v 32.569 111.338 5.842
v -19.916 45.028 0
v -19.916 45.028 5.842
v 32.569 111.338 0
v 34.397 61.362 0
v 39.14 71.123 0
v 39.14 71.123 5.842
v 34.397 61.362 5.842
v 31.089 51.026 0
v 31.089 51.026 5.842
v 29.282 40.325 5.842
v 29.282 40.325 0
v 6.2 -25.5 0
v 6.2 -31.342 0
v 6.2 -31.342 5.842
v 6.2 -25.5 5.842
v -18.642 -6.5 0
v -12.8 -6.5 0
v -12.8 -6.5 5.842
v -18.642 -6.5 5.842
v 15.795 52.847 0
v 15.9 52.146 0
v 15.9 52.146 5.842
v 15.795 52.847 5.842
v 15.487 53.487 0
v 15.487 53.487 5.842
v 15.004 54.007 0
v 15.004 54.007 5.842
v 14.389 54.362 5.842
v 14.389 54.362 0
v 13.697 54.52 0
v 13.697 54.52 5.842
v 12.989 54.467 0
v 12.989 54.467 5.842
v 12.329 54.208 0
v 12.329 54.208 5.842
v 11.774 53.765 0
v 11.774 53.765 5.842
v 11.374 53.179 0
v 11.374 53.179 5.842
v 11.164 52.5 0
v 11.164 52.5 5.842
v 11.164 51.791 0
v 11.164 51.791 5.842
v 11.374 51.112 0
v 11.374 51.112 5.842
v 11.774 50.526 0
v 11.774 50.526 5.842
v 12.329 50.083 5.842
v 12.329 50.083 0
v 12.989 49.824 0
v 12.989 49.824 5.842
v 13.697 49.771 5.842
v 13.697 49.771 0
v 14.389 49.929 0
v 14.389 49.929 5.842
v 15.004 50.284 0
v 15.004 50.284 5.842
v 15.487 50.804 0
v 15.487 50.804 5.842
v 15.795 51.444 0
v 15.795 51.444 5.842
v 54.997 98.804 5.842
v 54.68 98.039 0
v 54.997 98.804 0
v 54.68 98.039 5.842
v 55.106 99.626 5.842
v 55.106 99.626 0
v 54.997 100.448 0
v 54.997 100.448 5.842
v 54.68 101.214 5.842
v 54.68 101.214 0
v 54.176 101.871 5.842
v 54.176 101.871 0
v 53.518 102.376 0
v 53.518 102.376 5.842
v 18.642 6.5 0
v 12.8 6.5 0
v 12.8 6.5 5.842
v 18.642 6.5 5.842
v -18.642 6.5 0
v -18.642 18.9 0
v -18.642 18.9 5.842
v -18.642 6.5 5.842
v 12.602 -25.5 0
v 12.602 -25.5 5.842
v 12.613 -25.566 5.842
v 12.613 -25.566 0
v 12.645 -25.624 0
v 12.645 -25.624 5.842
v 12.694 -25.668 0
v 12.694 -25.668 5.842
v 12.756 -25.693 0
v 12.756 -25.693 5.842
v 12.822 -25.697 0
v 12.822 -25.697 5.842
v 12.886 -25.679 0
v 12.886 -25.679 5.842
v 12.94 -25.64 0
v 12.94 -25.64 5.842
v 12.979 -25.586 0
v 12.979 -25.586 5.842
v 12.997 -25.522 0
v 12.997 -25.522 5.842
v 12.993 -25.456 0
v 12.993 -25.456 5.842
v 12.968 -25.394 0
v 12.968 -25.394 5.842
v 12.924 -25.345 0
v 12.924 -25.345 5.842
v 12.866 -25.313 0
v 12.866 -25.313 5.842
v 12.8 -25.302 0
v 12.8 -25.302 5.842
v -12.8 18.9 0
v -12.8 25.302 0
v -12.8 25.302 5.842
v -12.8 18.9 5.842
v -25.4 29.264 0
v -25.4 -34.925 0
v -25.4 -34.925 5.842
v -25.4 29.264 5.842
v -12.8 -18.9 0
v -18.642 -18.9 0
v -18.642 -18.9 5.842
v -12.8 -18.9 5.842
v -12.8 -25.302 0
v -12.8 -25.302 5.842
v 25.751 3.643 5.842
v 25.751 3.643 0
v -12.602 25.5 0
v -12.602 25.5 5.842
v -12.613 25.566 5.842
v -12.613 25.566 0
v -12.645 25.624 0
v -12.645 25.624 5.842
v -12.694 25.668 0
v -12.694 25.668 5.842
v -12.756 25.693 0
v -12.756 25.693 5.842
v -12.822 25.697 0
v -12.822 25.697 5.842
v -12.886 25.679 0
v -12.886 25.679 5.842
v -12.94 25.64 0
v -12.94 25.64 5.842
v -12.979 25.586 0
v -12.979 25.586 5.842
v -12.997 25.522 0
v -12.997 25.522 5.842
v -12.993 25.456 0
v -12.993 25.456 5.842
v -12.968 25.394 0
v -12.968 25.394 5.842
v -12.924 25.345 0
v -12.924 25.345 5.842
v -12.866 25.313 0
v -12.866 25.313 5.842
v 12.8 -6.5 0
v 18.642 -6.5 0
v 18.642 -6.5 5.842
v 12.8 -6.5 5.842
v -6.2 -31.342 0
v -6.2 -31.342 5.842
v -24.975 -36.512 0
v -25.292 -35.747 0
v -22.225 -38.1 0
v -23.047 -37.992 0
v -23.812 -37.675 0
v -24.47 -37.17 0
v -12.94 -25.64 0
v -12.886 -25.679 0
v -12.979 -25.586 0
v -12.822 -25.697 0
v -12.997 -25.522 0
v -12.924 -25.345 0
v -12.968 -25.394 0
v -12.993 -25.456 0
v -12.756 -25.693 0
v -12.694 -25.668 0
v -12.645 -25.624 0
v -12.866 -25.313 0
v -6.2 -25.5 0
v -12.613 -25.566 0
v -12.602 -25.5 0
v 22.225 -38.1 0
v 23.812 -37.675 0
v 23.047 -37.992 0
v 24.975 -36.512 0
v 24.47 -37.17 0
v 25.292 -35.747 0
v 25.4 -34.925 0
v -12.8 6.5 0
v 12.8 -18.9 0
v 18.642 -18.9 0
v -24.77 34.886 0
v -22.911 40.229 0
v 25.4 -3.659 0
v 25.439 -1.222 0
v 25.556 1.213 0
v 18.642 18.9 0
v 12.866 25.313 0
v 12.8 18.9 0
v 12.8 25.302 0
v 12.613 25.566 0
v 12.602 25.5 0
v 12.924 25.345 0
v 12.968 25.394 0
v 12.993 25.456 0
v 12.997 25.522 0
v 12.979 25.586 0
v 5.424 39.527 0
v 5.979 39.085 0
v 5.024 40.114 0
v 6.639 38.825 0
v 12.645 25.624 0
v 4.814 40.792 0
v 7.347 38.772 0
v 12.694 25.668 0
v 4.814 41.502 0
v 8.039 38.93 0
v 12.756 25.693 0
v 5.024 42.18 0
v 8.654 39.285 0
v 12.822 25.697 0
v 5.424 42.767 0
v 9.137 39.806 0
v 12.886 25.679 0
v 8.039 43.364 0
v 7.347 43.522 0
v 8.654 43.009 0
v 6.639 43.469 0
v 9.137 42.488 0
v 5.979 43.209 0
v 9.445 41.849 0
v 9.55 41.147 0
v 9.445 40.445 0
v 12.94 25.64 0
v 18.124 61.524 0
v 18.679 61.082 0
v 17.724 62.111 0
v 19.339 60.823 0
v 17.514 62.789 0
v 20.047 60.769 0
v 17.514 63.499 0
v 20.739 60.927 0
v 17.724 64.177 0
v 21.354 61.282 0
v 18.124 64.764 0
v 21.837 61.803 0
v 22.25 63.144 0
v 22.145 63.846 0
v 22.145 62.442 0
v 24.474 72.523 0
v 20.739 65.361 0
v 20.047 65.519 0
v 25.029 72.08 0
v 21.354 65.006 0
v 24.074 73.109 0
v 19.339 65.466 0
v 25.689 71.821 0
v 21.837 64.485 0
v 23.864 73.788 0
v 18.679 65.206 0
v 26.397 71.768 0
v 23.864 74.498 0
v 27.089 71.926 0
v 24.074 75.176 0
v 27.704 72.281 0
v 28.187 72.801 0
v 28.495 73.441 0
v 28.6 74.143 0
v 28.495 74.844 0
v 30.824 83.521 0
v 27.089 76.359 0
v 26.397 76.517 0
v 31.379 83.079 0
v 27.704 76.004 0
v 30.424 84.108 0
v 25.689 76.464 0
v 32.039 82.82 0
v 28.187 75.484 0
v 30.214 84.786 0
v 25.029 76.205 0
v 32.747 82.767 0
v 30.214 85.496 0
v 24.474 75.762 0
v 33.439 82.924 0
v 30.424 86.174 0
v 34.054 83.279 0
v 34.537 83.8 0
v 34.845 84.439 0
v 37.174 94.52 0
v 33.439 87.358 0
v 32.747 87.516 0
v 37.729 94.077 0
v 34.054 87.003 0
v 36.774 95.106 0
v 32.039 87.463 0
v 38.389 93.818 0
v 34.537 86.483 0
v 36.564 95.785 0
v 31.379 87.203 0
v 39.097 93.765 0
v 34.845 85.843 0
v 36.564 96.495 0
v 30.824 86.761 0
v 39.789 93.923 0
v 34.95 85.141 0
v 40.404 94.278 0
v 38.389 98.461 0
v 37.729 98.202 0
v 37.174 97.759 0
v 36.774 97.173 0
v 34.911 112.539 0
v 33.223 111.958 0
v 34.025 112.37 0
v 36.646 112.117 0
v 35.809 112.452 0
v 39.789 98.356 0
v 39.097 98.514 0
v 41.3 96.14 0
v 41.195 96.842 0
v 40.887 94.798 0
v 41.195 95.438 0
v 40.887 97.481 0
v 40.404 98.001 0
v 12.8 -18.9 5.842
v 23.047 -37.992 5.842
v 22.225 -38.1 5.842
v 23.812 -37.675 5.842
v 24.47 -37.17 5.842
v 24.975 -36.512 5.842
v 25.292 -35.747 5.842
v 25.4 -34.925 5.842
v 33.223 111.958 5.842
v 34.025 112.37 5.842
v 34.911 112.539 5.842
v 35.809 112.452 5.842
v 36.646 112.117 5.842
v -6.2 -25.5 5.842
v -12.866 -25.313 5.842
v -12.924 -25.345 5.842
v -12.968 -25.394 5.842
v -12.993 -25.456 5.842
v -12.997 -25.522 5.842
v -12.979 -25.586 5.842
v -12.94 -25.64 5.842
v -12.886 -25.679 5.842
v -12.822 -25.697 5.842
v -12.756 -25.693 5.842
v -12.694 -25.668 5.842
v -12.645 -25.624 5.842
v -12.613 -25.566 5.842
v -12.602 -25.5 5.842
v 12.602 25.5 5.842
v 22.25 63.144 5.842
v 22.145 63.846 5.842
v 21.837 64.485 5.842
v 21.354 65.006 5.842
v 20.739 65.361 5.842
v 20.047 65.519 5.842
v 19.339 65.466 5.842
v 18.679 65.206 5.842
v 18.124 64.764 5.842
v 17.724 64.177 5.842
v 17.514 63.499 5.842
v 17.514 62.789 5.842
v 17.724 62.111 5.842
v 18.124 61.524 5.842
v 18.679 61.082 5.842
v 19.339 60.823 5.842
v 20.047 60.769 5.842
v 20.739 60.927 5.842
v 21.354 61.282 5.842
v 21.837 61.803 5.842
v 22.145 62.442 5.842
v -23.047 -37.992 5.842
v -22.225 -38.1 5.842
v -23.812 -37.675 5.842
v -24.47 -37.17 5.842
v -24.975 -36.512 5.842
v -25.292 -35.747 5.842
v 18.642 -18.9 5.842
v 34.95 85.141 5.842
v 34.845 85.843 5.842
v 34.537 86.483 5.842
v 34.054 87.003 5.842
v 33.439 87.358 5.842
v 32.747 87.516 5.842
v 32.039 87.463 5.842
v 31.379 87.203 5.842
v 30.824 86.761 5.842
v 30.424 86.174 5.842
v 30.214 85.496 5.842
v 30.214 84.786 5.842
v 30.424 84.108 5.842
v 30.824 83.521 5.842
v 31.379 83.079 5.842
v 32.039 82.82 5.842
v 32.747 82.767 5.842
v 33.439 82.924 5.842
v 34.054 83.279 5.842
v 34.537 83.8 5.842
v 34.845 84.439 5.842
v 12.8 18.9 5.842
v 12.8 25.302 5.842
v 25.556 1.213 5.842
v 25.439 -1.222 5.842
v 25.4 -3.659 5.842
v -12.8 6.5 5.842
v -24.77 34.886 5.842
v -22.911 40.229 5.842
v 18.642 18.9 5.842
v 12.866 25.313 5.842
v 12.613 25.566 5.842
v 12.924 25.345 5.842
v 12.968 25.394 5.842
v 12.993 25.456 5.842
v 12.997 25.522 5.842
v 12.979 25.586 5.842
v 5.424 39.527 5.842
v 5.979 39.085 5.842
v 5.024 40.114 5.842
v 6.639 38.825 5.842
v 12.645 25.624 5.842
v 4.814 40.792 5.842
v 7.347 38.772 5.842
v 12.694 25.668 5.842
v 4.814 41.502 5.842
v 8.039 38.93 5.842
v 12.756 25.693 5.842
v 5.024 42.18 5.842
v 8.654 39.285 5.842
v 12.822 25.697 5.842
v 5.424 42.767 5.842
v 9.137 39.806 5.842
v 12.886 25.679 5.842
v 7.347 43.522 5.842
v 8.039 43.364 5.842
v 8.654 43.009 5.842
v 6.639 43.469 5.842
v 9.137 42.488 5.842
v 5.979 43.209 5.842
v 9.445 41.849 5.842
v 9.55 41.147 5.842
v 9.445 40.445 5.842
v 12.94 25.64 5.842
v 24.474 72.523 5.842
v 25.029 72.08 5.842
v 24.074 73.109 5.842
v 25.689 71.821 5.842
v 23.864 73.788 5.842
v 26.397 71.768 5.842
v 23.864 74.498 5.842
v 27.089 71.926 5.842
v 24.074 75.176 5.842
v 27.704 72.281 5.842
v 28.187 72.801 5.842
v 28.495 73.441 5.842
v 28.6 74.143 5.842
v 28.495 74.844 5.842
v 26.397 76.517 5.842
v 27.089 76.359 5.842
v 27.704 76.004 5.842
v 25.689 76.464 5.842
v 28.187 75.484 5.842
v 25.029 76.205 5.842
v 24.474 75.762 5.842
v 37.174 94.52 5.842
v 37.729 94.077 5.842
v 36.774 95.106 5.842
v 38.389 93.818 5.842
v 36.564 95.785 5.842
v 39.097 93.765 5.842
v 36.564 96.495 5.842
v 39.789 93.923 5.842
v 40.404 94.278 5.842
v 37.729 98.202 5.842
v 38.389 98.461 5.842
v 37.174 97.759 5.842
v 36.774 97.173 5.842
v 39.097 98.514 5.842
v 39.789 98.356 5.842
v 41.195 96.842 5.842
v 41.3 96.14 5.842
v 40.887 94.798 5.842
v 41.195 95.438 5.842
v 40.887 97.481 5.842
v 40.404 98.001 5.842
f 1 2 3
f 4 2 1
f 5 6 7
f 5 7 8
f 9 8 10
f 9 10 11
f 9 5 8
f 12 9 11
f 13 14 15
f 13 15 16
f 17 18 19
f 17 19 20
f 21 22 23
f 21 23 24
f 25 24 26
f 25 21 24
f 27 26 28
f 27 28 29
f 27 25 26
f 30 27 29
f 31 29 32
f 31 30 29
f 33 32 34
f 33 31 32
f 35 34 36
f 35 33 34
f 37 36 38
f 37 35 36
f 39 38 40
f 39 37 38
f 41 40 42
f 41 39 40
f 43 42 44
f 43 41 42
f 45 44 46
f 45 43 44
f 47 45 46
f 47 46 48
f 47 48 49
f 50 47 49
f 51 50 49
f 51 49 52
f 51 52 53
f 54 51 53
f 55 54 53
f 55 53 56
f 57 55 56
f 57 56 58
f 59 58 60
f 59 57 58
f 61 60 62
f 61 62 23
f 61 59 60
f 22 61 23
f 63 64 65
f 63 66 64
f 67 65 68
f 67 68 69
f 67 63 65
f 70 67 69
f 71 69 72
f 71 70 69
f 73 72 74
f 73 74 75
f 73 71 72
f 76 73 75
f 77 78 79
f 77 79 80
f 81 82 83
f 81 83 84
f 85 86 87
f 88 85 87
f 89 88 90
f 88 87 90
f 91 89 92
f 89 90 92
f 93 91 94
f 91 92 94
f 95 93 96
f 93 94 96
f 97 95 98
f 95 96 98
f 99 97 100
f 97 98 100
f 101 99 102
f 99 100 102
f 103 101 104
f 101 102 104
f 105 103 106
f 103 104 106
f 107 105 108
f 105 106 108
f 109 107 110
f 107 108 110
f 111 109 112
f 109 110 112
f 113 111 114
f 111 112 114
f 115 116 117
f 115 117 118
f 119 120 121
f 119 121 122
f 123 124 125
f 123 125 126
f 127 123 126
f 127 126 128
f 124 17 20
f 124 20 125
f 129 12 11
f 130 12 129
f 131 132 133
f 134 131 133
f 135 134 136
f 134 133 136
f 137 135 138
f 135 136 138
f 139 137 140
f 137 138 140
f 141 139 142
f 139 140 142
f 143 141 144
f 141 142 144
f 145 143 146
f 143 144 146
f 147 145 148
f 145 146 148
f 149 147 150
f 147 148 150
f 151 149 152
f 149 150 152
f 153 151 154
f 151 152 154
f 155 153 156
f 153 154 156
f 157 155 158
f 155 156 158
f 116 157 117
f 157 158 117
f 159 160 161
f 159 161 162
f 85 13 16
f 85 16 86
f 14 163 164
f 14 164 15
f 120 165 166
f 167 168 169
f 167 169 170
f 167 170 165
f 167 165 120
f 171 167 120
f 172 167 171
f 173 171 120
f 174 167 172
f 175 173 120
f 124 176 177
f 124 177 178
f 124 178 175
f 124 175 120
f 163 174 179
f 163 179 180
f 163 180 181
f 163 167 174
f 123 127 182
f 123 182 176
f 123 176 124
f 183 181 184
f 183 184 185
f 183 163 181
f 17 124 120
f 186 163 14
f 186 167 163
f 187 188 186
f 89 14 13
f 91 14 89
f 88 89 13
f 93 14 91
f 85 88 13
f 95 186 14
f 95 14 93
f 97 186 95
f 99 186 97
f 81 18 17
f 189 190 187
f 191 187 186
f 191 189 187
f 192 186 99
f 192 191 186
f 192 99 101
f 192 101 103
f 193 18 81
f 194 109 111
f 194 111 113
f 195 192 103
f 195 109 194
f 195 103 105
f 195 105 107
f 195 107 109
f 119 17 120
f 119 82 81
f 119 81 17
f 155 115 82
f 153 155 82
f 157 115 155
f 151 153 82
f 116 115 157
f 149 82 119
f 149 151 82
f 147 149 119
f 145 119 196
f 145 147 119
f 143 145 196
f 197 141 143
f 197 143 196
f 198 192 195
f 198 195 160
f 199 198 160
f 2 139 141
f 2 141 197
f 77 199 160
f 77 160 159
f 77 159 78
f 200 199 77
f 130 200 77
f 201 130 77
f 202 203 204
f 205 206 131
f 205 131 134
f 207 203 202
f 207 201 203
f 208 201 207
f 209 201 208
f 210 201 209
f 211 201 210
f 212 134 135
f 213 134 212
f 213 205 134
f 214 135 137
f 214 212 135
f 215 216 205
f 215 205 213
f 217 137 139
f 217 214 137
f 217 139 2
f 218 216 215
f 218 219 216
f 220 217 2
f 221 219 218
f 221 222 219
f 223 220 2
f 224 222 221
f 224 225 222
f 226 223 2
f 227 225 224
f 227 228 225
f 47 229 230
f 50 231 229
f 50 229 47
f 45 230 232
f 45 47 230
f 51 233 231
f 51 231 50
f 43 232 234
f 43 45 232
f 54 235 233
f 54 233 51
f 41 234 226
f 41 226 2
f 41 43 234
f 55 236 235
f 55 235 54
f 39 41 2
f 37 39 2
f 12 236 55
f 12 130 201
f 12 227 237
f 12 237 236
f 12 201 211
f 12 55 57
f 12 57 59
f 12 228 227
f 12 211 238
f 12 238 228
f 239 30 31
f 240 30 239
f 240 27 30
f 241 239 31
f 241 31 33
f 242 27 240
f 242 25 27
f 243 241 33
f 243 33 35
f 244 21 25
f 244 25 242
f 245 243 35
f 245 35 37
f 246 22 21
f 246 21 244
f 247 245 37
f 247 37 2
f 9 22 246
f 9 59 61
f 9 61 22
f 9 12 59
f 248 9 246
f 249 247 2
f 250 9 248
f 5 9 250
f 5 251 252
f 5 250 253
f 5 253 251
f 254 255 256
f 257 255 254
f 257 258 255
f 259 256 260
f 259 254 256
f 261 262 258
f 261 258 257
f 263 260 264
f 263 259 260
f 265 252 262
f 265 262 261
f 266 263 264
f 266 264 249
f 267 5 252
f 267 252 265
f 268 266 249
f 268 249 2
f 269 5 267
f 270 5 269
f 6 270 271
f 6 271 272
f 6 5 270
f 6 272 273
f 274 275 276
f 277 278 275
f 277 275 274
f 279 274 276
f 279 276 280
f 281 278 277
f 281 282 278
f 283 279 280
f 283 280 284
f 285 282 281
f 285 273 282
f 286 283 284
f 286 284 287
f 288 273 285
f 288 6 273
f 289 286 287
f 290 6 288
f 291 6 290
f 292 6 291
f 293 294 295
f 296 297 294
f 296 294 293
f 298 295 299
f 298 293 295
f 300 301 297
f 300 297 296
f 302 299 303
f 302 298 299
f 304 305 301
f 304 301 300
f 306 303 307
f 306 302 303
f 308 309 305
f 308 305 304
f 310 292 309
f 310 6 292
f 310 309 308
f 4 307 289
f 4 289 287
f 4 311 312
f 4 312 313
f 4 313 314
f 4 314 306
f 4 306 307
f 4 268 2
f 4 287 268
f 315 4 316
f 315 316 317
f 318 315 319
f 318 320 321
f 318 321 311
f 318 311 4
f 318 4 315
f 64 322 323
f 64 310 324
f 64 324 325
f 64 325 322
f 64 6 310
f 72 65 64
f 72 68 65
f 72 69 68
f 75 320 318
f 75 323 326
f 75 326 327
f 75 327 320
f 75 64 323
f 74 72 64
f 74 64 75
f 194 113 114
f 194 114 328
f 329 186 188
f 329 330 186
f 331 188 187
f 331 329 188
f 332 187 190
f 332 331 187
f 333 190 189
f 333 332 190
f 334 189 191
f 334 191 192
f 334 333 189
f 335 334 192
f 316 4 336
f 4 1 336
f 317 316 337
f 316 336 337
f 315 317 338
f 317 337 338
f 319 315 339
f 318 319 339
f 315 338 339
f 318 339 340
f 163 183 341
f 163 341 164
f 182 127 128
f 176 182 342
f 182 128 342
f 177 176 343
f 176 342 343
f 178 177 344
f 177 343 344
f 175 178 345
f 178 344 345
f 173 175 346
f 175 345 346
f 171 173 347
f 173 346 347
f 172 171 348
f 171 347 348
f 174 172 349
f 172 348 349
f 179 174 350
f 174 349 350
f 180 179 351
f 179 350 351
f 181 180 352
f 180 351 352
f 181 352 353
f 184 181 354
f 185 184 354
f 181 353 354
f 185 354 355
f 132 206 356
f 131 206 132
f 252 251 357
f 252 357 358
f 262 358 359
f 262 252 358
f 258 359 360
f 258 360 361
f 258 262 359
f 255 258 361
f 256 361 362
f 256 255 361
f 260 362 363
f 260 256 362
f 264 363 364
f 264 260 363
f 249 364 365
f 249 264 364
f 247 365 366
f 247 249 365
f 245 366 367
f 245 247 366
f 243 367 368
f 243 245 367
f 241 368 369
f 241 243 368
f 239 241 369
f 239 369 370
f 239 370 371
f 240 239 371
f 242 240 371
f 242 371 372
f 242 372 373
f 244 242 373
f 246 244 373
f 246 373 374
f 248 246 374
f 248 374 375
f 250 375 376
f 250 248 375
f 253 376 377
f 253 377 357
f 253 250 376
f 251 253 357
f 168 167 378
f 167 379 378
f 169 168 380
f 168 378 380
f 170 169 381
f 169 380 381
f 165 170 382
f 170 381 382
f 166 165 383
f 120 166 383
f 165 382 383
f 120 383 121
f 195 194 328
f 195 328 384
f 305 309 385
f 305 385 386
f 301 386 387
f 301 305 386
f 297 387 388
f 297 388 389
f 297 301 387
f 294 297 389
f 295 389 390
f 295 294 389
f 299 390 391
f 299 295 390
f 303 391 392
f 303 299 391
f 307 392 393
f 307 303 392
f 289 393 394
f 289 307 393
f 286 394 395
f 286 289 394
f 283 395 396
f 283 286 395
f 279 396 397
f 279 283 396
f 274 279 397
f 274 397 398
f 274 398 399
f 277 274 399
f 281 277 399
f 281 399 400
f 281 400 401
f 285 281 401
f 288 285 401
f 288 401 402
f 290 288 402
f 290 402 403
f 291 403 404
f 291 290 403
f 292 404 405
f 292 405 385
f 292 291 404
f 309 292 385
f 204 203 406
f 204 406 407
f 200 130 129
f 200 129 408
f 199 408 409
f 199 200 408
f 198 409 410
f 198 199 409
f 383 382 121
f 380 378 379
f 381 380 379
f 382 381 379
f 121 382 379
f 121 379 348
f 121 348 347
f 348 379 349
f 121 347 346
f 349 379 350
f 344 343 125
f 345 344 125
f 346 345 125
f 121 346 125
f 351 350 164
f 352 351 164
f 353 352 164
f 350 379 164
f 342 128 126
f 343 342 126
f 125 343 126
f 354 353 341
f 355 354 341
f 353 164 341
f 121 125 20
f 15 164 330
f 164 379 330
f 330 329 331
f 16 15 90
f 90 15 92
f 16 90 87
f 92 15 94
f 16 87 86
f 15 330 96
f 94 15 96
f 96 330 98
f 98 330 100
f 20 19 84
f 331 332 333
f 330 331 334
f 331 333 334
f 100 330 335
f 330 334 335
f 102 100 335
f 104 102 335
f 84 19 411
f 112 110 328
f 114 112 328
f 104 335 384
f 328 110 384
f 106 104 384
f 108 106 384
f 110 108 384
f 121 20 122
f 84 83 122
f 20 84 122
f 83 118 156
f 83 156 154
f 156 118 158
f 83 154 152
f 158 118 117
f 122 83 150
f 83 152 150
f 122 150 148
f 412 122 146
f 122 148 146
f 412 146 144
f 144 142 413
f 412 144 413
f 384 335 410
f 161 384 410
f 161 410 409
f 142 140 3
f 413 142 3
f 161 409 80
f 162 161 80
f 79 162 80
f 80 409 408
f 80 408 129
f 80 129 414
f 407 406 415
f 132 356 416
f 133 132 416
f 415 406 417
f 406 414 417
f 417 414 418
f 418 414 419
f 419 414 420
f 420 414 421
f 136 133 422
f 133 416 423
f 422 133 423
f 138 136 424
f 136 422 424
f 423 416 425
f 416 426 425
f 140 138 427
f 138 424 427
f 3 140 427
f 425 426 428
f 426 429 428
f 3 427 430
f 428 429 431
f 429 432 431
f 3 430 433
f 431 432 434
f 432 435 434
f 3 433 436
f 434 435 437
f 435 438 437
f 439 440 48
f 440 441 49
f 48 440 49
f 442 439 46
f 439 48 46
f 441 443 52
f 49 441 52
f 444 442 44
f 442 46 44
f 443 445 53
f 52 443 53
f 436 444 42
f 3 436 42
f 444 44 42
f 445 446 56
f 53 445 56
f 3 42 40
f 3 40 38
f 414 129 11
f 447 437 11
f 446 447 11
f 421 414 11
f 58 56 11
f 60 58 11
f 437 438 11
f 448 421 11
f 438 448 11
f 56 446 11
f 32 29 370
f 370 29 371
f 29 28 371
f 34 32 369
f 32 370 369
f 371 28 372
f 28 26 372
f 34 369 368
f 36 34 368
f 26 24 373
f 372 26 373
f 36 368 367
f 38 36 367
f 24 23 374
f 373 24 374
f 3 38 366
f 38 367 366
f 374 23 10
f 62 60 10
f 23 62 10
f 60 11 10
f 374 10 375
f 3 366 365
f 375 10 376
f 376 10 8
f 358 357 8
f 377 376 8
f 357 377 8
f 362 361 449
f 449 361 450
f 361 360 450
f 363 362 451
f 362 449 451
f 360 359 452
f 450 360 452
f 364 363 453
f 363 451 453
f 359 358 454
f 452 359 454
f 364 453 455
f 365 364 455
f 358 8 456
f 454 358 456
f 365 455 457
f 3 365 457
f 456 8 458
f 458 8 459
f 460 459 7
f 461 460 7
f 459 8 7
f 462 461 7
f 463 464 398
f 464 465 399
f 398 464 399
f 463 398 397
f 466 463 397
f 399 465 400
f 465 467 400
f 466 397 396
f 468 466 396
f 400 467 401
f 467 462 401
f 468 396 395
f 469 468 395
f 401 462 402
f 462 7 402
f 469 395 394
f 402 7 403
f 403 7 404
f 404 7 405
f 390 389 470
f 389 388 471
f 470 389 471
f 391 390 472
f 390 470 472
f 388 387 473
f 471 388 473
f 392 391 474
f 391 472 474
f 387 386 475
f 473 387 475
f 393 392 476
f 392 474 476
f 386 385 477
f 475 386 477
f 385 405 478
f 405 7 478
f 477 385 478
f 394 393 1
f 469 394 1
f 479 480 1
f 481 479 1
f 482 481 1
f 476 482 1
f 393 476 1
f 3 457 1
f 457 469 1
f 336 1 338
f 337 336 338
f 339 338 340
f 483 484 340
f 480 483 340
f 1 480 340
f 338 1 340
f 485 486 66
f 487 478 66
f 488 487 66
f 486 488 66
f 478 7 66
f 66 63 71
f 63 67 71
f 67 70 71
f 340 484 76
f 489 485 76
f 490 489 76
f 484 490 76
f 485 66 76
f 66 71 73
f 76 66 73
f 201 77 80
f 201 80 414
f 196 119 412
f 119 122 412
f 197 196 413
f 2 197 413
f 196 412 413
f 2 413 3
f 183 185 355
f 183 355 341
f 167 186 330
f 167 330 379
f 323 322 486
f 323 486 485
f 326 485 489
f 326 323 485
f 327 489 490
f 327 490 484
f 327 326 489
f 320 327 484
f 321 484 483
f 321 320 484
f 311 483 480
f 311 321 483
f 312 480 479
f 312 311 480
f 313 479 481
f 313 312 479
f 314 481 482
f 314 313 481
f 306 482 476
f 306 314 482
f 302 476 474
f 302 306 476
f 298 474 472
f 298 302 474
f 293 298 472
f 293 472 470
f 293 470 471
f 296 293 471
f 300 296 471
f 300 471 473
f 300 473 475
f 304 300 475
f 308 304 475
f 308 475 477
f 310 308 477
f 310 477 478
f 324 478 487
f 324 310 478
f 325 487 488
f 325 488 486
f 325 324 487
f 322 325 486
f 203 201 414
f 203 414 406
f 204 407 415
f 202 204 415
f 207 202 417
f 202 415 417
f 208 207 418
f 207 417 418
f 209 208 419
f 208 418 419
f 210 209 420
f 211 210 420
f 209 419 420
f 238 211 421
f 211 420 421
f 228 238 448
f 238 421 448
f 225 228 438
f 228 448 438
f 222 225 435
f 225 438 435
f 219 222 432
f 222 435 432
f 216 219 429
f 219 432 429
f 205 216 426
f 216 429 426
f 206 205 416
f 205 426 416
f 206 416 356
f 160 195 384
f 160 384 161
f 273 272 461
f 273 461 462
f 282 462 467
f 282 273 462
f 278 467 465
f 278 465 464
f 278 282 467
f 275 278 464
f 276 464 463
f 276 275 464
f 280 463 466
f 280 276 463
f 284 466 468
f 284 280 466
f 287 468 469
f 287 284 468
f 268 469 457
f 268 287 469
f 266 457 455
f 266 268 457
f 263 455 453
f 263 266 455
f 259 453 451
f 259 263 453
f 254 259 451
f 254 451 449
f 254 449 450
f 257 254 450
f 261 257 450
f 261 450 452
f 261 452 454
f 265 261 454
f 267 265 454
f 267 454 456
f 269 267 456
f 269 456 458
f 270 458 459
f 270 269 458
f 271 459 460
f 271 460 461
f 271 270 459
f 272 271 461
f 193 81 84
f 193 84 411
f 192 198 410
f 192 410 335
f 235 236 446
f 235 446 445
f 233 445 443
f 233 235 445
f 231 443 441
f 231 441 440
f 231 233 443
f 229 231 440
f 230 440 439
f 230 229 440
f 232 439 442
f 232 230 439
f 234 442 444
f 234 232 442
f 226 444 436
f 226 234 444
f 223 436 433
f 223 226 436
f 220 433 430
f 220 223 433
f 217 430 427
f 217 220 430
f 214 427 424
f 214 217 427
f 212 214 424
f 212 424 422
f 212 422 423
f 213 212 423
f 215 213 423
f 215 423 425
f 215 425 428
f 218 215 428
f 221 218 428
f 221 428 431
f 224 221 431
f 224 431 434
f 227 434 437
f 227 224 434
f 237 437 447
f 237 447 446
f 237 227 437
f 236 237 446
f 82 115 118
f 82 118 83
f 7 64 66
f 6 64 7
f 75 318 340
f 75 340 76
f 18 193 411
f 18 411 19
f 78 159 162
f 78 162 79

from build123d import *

# Parameters (mm, degrees)
SKETCH1_R           = 2.38125
BOSS_EXTRUDE1_DEPTH = 5.842
FILLET1_R           = 3.175
FILLET3_R           = 76.2
FILLET4_R           = 25.4
SKETCH2_R           = 0.1984375
CUT_EXTRUDE1_DEPTH  = 126.445308344


with BuildPart() as part:
    # Sketch1 → Boss-Extrude1 (new body)
    with BuildSketch(Plane.XY):
        Polygon((25.4, -38.1), (-25.4, -38.1), (-25.4, 38.1), (34.270606379, 113.488181024), (56.267651635, 100.788181024), (30.867651635, 56.794090512), (25.4, 0), align=None)
        with Locations((7.169129007, 41.147045256)):
            Circle(SKETCH1_R, mode=Mode.SUBTRACT)
        with Locations((13.519129007, 52.145567884)):
            Circle(SKETCH1_R, mode=Mode.SUBTRACT)
        with Locations((19.869129007, 63.144090512)):
            Circle(SKETCH1_R, mode=Mode.SUBTRACT)
        with Locations((26.219129007, 74.14261314)):
            Circle(SKETCH1_R, mode=Mode.SUBTRACT)
        with Locations((32.569129007, 85.141135768)):
            Circle(SKETCH1_R, mode=Mode.SUBTRACT)
        with Locations((38.919129007, 96.139658396)):
            Circle(SKETCH1_R, mode=Mode.SUBTRACT)
        Polygon((-12.800000054, -25.5), (-6.2, -25.5), (-6.2, -31.342), (6.2, -31.342), (6.2, -25.5), (12.800000054, -25.5), (12.800000054, -18.9), (18.642000054, -18.9), (18.642000054, -6.5), (12.800000054, -6.5), (12.800000054, 6.5), (18.642000054, 6.5), (18.642000054, 18.9), (12.800000054, 18.9), (12.800000054, 25.5), (-12.800000054, 25.5), (-12.800000054, 18.9), (-18.642000054, 18.9), (-18.642000054, 6.5), (-12.800000054, 6.5), (-12.800000054, -6.5), (-18.642000054, -6.5), (-18.642000054, -18.9), (-12.800000054, -18.9), align=None, mode=Mode.SUBTRACT)
    extrude(amount=BOSS_EXTRUDE1_DEPTH)

    # Fillet1
    fillet1_edges = [part.edges().sort_by_distance(p)[0] for p in [
        (34.270606379, 113.488181024, 2.921),
        (56.267651635, 100.788181024, 2.921),
        (25.4, -38.1, 2.921),
        (-25.4, -38.1, 2.921),
    ]]
    fillet(fillet1_edges, radius=FILLET1_R)

    # Fillet3
    # the kernel refuses this fillet: 76.2 mm, written as the material it adds along each edge
    with BuildSketch(Plane(origin=(30.867651635, 56.794090512, 0), x_dir=(-0.09582843425224026, -0.9953978657746682, 0), z_dir=(0, 0, 1))) as fillet3_piece_1:
        with BuildLine():
            CenterArc((FILLET3_R * 0.217130392833, FILLET3_R), FILLET3_R, 245.499003148, 24.500996852)
            Line((-FILLET3_R * 0.197578681587, FILLET3_R * 0.0900459442402), (0, 0))
            Line((0, 0), (FILLET3_R * 0.217130392833, 0))
        make_face()
    extrude(amount=5.842)
    with BuildSketch(Plane(origin=(25.4, 0, 0), x_dir=(0, -1, 0), z_dir=(0, 0, 1))) as fillet3_piece_2:
        with BuildLine():
            CenterArc((FILLET3_R * 0.048024725242, FILLET3_R), FILLET3_R, 264.500996852, 5.499003148)
            Line((-FILLET3_R * 0.0478037090103, FILLET3_R * 0.00460213422533), (0, 0))
            Line((0, 0), (FILLET3_R * 0.048024725242, 0))
        make_face()
    extrude(amount=5.842)

    # Fillet4
    fillet4_edges = [part.edges().sort_by_distance(p)[0] for p in [
        (-25.4, 38.1, 2.921),
    ]]
    fillet(fillet4_edges, radius=FILLET4_R)

    # Sketch2 → Cut-Extrude1 (cut, through all)
    with BuildSketch(Plane.XY.offset(5.842)):
        with Locations((-12.800000054, 25.5)):
            Circle(SKETCH2_R)
        with Locations((12.800000054, 25.5)):
            Circle(SKETCH2_R)
        with Locations((12.800000054, -25.5)):
            Circle(SKETCH2_R)
        with Locations((-12.800000054, -25.5)):
            Circle(SKETCH2_R)
    extrude(amount=-CUT_EXTRUDE1_DEPTH, mode=Mode.SUBTRACT)


solid = part.part
